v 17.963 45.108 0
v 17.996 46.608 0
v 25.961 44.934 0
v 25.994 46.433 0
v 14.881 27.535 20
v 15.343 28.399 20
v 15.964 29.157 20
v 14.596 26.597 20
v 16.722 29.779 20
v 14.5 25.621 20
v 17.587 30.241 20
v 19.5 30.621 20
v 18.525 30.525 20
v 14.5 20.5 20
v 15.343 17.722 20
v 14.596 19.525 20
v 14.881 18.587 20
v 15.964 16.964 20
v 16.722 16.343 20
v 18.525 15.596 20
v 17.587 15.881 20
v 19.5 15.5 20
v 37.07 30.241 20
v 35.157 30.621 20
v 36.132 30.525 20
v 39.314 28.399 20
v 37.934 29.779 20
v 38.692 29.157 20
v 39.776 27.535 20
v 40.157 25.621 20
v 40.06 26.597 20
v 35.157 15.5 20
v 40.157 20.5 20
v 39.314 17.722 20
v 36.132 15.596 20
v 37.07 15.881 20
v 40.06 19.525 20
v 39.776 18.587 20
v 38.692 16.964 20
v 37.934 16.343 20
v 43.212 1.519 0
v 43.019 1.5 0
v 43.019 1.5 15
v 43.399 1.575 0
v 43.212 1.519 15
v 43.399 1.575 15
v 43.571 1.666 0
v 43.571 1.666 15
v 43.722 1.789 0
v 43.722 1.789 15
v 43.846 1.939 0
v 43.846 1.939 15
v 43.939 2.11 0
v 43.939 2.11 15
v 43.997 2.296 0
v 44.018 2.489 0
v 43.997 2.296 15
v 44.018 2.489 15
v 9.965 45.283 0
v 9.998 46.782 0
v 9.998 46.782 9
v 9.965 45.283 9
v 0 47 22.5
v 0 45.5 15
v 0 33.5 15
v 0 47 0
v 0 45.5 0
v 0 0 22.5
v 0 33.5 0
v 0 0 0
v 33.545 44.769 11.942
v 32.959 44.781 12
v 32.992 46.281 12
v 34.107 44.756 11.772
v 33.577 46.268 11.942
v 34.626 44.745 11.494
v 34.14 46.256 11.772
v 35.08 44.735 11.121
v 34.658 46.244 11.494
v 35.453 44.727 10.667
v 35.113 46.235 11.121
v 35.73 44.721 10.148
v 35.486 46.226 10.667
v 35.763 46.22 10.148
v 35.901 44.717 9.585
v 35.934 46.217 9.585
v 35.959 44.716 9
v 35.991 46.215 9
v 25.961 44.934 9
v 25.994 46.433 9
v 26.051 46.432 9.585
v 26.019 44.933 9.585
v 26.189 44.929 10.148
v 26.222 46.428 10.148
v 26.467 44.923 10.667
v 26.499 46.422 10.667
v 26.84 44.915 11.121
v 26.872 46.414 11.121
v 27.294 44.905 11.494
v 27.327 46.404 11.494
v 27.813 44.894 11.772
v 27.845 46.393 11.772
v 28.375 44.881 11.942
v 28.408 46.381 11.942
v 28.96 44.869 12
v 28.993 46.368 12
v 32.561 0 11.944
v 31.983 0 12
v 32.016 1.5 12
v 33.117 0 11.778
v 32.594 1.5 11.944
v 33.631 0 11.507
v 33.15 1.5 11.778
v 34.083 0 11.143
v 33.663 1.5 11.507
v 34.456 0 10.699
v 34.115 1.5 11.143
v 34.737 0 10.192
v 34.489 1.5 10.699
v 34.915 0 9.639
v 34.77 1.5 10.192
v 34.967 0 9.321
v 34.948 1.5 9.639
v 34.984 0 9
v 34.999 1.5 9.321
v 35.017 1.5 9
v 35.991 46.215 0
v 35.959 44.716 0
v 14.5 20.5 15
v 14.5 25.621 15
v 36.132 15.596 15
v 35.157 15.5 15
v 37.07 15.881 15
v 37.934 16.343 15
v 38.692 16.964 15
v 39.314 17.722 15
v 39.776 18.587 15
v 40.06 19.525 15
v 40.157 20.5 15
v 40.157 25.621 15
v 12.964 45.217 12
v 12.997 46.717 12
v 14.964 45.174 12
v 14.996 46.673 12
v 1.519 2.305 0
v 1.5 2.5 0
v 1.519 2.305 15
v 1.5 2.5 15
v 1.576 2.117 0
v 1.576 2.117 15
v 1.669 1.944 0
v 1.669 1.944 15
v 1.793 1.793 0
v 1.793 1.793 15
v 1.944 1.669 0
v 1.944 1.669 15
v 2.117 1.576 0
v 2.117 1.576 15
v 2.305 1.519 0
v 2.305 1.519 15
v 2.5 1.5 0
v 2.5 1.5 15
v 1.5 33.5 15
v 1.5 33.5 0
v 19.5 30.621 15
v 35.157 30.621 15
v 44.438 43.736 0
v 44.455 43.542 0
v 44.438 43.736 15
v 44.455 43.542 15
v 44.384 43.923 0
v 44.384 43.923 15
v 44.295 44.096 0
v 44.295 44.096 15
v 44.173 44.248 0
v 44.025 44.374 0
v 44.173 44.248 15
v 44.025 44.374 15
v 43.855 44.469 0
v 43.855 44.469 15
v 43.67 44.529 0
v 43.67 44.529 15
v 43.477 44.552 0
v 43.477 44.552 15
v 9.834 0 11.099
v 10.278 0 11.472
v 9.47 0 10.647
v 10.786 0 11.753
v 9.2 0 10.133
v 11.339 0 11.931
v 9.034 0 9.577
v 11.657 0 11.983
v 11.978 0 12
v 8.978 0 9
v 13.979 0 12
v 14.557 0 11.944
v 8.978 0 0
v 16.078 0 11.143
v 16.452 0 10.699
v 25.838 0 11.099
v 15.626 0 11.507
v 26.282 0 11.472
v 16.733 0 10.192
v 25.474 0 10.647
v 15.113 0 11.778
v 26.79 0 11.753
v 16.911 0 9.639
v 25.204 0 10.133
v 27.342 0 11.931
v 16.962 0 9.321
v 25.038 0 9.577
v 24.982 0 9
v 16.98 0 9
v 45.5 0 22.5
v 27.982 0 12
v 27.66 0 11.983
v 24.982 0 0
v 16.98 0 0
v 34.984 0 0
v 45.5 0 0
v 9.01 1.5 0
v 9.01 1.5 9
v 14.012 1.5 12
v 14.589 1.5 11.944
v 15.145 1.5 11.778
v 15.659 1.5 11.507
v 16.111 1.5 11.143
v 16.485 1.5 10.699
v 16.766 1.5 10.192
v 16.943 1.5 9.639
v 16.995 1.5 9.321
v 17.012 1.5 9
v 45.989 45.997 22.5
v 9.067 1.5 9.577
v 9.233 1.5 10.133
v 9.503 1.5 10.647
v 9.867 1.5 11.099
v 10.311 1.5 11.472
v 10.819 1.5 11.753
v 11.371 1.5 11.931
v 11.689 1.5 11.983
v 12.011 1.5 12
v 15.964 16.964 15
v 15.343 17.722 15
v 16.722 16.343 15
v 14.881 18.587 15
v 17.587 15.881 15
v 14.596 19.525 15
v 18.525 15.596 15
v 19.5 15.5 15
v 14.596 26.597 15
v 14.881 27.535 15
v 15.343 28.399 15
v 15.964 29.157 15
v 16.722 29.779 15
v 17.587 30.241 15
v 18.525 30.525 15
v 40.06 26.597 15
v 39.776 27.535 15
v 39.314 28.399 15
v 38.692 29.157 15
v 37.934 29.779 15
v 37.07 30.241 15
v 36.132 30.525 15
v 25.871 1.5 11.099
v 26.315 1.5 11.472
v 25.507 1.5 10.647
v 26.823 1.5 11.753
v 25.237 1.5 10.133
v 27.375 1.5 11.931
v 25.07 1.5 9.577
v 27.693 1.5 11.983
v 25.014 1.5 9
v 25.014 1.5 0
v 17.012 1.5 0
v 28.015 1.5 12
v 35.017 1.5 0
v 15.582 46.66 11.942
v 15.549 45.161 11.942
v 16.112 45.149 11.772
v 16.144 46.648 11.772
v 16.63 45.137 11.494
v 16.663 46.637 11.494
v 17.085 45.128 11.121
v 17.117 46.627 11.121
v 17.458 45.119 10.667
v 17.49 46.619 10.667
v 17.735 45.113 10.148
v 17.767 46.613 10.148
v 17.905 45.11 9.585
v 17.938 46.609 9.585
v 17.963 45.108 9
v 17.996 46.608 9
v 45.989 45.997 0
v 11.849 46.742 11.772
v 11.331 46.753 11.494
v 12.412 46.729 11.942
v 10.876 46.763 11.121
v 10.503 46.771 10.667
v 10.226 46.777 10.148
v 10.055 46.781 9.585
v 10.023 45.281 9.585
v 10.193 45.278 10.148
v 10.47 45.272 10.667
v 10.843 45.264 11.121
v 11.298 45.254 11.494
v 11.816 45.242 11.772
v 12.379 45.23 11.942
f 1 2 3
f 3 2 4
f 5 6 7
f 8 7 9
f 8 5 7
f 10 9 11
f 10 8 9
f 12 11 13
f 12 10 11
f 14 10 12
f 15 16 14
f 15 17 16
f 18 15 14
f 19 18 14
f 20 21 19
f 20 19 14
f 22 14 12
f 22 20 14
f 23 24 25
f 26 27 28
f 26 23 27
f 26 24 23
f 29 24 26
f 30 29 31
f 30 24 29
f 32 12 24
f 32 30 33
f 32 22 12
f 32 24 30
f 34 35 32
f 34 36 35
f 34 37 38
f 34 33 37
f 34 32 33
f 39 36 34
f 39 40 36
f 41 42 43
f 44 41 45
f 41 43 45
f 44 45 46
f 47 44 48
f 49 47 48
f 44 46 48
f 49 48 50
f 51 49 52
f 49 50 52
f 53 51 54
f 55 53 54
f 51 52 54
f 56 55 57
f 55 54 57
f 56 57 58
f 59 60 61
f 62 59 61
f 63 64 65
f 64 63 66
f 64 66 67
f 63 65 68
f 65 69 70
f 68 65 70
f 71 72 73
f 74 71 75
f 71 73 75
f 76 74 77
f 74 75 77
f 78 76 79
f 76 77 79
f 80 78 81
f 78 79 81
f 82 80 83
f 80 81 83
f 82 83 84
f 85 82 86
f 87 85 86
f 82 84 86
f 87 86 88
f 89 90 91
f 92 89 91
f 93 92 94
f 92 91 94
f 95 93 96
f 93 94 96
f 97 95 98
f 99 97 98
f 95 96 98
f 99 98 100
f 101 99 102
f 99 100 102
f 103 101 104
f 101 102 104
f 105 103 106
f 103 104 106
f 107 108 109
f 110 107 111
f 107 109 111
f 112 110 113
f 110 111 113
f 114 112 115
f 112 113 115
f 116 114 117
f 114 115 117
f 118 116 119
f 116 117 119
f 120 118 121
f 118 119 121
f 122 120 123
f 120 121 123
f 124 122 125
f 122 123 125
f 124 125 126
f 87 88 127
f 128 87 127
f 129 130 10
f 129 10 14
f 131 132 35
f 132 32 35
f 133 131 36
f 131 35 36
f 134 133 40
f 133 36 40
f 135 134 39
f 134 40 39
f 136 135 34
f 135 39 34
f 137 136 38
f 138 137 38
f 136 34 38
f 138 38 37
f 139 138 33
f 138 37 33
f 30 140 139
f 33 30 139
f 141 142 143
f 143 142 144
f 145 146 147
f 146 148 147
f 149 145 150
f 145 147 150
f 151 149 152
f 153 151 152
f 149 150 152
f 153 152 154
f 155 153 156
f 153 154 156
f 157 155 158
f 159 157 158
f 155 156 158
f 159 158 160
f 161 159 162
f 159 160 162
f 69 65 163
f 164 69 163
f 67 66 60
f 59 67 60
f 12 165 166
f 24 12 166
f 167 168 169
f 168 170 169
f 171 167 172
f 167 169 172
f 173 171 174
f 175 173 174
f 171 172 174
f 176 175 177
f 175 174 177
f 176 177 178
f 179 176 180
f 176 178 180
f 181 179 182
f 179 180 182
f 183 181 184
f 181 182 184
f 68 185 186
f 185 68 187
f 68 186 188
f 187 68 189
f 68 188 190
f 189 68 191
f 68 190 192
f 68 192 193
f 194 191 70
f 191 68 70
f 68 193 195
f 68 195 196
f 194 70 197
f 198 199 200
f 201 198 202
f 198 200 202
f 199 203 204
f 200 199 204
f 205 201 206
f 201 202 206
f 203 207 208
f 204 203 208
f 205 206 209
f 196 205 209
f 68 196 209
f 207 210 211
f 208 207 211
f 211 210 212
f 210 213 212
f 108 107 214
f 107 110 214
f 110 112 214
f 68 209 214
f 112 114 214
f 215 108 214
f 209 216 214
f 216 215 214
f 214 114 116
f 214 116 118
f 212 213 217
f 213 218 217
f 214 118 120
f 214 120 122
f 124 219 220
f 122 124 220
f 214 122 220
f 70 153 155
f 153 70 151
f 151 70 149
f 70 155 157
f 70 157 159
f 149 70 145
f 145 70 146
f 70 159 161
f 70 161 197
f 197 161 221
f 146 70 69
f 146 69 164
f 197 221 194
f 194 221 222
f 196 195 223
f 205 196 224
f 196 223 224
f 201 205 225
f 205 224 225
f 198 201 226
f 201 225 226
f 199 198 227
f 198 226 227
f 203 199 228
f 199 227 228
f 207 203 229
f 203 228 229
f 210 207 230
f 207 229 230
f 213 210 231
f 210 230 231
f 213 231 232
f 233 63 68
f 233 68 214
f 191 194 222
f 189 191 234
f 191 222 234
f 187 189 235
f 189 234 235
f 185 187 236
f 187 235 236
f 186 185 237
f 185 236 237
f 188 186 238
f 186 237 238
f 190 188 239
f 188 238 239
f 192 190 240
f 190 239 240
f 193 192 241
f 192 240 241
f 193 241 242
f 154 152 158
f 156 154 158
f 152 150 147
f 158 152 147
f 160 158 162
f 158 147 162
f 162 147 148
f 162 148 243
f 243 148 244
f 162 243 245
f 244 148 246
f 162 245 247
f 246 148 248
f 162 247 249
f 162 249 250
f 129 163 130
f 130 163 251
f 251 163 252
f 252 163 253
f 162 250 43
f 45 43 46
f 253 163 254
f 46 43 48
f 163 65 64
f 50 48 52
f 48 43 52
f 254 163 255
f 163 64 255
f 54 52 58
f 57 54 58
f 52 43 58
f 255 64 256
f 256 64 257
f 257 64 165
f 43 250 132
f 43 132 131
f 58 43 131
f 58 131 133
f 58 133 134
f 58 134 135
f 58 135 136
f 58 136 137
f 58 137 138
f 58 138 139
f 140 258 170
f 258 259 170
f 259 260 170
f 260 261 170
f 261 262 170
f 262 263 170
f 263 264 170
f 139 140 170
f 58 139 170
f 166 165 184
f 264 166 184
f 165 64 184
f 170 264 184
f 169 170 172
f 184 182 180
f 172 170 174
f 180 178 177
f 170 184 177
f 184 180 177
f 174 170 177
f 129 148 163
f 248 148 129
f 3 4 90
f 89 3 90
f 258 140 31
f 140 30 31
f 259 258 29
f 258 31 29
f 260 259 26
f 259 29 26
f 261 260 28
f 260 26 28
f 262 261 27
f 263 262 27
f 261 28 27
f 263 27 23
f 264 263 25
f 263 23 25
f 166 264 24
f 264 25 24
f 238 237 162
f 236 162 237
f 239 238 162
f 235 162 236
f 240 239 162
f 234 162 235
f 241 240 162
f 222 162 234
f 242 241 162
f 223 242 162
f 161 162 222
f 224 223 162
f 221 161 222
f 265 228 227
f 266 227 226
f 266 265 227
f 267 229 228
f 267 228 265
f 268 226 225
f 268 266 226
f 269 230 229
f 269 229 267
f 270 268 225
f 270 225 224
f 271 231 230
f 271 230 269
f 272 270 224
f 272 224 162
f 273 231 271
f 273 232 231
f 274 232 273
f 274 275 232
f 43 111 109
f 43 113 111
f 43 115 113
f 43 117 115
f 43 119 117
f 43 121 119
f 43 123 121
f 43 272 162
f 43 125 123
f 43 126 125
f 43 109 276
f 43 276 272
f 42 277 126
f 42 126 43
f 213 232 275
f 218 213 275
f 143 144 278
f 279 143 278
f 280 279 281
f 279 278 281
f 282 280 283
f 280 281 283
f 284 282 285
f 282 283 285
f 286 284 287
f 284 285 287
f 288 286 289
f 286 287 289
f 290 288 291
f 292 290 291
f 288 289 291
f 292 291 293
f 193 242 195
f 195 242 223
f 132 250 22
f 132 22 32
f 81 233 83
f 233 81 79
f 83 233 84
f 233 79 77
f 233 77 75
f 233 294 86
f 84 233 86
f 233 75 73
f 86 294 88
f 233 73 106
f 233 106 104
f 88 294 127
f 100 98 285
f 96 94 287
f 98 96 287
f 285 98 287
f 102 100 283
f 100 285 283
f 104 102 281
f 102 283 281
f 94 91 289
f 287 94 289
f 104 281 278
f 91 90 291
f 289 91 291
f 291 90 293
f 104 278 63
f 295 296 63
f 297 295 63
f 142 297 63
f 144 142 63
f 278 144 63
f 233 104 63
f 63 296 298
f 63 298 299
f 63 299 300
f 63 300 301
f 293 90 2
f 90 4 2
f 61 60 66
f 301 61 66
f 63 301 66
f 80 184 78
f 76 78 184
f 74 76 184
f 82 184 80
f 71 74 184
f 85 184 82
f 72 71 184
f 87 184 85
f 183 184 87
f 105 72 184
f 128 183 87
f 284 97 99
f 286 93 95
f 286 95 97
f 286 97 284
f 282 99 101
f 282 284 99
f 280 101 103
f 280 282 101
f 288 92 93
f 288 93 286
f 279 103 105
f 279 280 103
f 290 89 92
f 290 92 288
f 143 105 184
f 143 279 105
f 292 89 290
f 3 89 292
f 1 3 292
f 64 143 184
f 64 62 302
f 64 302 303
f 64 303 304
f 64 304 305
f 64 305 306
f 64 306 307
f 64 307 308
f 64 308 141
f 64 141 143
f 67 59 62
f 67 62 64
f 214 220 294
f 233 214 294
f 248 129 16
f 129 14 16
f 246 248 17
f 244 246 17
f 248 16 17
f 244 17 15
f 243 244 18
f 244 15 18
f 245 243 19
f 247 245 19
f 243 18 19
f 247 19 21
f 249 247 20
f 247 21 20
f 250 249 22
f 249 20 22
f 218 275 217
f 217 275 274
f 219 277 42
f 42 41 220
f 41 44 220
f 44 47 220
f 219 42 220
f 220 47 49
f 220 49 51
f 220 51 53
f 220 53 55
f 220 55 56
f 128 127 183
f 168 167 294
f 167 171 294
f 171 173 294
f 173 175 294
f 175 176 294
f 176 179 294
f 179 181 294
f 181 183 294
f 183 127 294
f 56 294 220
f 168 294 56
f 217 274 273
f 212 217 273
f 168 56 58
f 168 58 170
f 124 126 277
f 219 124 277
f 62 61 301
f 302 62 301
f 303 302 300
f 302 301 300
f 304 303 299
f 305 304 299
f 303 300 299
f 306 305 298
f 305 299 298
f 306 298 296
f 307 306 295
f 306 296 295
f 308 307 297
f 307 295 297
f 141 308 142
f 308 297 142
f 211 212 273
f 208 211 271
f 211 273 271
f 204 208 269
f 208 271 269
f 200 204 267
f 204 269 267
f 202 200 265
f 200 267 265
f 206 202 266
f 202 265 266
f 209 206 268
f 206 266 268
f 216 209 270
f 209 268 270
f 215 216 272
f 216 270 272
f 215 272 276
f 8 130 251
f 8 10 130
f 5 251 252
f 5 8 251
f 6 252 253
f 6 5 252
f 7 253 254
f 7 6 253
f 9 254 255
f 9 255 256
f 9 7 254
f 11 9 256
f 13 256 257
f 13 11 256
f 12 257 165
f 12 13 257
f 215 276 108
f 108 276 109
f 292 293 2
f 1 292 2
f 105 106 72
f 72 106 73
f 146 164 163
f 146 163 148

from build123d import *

# Parameters (mm, degrees)
F1_DEPTH = 22.5
F3_DEPTH = 15
F4_W     = 25.6565664813
F4_H     = 15.121226953
F5_DEPTH = 5
F6_R     = 5
F8_DEPTH = 46.9898349885
F9_R     = 1


with BuildPart() as f1:
    # F0 (on Top) → F1 (new body)
    with BuildSketch(Plane.XY):
        Polygon((0, 47), (0, 0), (45.5, 0), (45.9890725419, 45.997400014), align=None)
    extrude(amount=F1_DEPTH)

    # F2 (on Top) → F3 (cut)
    with BuildSketch(Plane.XY):
        Polygon((1.5, 33.5), (1.5, 1.5), (44.0079360013, 1.5), (44.4654638771, 44.5306159486), (0, 45.5), (0, 33.5), align=None)
    extrude(amount=F3_DEPTH, mode=Mode.SUBTRACT)

    # F4 (on face) → F5 (cut)
    with BuildSketch(Plane(origin=(0, 0, 15), x_dir=(1, 0, 0), z_dir=(0, 0, -1))):
        with Locations((27.3282832406, -23.0606134765)):
            Rectangle(F4_W, F4_H)
    extrude(amount=-F5_DEPTH, mode=Mode.SUBTRACT)

    # F6
    f6_edges = [f1.edges().sort_by_distance(p)[0] for p in [
        (14.5, 30.621227, 17.5),
        (40.156566, 30.621227, 17.5),
        (14.5, 15.5, 17.5),
        (40.156566, 15.5, 17.5),
    ]]
    fillet(f6_edges, radius=F6_R)

    # F7 (on face) → F8 (cut, through all)
    with BuildSketch(Plane(origin=(1.0241522892, 46.9776726293, 0), x_dir=(-0.9997624466, 0.0217956519, 0), z_dir=(0.0217956519, 0.9997624466, 0))):
        with BuildLine():
            Line((-16.9756043621, 0), (-8.9756043621, 0))
            Line((-8.9756043621, 0), (-8.9756043621, 9))
            ThreePointArc((-8.9756043621, 9), (-9.8542840186, 11.1213203436), (-11.9756043621, 12))
            Line((-11.9756043621, 12), (-13.9756043621, 12))
            ThreePointArc((-13.9756043621, 12), (-16.0969247057, 11.1213203436), (-16.9756043621, 9))
            Line((-16.9756043621, 9), (-16.9756043621, 0))
        make_face()
        with BuildLine():
            Line((-34.9756043621, 0), (-24.9756043621, 0))
            Line((-24.9756043621, 0), (-24.9756043621, 9))
            ThreePointArc((-24.9756043621, 9), (-25.8542840186, 11.1213203436), (-27.9756043621, 12))
            Line((-27.9756043621, 12), (-31.9756043621, 12))
            ThreePointArc((-31.9756043621, 12), (-34.0969247057, 11.1213203436), (-34.9756043621, 9))
            Line((-34.9756043621, 9), (-34.9756043621, 0))
        make_face()
    extrude(amount=-F8_DEPTH, mode=Mode.SUBTRACT)

    # F9
    f9_edges = [f1.edges().sort_by_distance(p)[0] for p in [
        (1.5, 1.5, 7.5),
        (44.007936, 1.5, 7.5),
        (44.465464, 44.530616, 7.5),
    ]]
    fillet(f9_edges, radius=F9_R)


solid = f1.part
